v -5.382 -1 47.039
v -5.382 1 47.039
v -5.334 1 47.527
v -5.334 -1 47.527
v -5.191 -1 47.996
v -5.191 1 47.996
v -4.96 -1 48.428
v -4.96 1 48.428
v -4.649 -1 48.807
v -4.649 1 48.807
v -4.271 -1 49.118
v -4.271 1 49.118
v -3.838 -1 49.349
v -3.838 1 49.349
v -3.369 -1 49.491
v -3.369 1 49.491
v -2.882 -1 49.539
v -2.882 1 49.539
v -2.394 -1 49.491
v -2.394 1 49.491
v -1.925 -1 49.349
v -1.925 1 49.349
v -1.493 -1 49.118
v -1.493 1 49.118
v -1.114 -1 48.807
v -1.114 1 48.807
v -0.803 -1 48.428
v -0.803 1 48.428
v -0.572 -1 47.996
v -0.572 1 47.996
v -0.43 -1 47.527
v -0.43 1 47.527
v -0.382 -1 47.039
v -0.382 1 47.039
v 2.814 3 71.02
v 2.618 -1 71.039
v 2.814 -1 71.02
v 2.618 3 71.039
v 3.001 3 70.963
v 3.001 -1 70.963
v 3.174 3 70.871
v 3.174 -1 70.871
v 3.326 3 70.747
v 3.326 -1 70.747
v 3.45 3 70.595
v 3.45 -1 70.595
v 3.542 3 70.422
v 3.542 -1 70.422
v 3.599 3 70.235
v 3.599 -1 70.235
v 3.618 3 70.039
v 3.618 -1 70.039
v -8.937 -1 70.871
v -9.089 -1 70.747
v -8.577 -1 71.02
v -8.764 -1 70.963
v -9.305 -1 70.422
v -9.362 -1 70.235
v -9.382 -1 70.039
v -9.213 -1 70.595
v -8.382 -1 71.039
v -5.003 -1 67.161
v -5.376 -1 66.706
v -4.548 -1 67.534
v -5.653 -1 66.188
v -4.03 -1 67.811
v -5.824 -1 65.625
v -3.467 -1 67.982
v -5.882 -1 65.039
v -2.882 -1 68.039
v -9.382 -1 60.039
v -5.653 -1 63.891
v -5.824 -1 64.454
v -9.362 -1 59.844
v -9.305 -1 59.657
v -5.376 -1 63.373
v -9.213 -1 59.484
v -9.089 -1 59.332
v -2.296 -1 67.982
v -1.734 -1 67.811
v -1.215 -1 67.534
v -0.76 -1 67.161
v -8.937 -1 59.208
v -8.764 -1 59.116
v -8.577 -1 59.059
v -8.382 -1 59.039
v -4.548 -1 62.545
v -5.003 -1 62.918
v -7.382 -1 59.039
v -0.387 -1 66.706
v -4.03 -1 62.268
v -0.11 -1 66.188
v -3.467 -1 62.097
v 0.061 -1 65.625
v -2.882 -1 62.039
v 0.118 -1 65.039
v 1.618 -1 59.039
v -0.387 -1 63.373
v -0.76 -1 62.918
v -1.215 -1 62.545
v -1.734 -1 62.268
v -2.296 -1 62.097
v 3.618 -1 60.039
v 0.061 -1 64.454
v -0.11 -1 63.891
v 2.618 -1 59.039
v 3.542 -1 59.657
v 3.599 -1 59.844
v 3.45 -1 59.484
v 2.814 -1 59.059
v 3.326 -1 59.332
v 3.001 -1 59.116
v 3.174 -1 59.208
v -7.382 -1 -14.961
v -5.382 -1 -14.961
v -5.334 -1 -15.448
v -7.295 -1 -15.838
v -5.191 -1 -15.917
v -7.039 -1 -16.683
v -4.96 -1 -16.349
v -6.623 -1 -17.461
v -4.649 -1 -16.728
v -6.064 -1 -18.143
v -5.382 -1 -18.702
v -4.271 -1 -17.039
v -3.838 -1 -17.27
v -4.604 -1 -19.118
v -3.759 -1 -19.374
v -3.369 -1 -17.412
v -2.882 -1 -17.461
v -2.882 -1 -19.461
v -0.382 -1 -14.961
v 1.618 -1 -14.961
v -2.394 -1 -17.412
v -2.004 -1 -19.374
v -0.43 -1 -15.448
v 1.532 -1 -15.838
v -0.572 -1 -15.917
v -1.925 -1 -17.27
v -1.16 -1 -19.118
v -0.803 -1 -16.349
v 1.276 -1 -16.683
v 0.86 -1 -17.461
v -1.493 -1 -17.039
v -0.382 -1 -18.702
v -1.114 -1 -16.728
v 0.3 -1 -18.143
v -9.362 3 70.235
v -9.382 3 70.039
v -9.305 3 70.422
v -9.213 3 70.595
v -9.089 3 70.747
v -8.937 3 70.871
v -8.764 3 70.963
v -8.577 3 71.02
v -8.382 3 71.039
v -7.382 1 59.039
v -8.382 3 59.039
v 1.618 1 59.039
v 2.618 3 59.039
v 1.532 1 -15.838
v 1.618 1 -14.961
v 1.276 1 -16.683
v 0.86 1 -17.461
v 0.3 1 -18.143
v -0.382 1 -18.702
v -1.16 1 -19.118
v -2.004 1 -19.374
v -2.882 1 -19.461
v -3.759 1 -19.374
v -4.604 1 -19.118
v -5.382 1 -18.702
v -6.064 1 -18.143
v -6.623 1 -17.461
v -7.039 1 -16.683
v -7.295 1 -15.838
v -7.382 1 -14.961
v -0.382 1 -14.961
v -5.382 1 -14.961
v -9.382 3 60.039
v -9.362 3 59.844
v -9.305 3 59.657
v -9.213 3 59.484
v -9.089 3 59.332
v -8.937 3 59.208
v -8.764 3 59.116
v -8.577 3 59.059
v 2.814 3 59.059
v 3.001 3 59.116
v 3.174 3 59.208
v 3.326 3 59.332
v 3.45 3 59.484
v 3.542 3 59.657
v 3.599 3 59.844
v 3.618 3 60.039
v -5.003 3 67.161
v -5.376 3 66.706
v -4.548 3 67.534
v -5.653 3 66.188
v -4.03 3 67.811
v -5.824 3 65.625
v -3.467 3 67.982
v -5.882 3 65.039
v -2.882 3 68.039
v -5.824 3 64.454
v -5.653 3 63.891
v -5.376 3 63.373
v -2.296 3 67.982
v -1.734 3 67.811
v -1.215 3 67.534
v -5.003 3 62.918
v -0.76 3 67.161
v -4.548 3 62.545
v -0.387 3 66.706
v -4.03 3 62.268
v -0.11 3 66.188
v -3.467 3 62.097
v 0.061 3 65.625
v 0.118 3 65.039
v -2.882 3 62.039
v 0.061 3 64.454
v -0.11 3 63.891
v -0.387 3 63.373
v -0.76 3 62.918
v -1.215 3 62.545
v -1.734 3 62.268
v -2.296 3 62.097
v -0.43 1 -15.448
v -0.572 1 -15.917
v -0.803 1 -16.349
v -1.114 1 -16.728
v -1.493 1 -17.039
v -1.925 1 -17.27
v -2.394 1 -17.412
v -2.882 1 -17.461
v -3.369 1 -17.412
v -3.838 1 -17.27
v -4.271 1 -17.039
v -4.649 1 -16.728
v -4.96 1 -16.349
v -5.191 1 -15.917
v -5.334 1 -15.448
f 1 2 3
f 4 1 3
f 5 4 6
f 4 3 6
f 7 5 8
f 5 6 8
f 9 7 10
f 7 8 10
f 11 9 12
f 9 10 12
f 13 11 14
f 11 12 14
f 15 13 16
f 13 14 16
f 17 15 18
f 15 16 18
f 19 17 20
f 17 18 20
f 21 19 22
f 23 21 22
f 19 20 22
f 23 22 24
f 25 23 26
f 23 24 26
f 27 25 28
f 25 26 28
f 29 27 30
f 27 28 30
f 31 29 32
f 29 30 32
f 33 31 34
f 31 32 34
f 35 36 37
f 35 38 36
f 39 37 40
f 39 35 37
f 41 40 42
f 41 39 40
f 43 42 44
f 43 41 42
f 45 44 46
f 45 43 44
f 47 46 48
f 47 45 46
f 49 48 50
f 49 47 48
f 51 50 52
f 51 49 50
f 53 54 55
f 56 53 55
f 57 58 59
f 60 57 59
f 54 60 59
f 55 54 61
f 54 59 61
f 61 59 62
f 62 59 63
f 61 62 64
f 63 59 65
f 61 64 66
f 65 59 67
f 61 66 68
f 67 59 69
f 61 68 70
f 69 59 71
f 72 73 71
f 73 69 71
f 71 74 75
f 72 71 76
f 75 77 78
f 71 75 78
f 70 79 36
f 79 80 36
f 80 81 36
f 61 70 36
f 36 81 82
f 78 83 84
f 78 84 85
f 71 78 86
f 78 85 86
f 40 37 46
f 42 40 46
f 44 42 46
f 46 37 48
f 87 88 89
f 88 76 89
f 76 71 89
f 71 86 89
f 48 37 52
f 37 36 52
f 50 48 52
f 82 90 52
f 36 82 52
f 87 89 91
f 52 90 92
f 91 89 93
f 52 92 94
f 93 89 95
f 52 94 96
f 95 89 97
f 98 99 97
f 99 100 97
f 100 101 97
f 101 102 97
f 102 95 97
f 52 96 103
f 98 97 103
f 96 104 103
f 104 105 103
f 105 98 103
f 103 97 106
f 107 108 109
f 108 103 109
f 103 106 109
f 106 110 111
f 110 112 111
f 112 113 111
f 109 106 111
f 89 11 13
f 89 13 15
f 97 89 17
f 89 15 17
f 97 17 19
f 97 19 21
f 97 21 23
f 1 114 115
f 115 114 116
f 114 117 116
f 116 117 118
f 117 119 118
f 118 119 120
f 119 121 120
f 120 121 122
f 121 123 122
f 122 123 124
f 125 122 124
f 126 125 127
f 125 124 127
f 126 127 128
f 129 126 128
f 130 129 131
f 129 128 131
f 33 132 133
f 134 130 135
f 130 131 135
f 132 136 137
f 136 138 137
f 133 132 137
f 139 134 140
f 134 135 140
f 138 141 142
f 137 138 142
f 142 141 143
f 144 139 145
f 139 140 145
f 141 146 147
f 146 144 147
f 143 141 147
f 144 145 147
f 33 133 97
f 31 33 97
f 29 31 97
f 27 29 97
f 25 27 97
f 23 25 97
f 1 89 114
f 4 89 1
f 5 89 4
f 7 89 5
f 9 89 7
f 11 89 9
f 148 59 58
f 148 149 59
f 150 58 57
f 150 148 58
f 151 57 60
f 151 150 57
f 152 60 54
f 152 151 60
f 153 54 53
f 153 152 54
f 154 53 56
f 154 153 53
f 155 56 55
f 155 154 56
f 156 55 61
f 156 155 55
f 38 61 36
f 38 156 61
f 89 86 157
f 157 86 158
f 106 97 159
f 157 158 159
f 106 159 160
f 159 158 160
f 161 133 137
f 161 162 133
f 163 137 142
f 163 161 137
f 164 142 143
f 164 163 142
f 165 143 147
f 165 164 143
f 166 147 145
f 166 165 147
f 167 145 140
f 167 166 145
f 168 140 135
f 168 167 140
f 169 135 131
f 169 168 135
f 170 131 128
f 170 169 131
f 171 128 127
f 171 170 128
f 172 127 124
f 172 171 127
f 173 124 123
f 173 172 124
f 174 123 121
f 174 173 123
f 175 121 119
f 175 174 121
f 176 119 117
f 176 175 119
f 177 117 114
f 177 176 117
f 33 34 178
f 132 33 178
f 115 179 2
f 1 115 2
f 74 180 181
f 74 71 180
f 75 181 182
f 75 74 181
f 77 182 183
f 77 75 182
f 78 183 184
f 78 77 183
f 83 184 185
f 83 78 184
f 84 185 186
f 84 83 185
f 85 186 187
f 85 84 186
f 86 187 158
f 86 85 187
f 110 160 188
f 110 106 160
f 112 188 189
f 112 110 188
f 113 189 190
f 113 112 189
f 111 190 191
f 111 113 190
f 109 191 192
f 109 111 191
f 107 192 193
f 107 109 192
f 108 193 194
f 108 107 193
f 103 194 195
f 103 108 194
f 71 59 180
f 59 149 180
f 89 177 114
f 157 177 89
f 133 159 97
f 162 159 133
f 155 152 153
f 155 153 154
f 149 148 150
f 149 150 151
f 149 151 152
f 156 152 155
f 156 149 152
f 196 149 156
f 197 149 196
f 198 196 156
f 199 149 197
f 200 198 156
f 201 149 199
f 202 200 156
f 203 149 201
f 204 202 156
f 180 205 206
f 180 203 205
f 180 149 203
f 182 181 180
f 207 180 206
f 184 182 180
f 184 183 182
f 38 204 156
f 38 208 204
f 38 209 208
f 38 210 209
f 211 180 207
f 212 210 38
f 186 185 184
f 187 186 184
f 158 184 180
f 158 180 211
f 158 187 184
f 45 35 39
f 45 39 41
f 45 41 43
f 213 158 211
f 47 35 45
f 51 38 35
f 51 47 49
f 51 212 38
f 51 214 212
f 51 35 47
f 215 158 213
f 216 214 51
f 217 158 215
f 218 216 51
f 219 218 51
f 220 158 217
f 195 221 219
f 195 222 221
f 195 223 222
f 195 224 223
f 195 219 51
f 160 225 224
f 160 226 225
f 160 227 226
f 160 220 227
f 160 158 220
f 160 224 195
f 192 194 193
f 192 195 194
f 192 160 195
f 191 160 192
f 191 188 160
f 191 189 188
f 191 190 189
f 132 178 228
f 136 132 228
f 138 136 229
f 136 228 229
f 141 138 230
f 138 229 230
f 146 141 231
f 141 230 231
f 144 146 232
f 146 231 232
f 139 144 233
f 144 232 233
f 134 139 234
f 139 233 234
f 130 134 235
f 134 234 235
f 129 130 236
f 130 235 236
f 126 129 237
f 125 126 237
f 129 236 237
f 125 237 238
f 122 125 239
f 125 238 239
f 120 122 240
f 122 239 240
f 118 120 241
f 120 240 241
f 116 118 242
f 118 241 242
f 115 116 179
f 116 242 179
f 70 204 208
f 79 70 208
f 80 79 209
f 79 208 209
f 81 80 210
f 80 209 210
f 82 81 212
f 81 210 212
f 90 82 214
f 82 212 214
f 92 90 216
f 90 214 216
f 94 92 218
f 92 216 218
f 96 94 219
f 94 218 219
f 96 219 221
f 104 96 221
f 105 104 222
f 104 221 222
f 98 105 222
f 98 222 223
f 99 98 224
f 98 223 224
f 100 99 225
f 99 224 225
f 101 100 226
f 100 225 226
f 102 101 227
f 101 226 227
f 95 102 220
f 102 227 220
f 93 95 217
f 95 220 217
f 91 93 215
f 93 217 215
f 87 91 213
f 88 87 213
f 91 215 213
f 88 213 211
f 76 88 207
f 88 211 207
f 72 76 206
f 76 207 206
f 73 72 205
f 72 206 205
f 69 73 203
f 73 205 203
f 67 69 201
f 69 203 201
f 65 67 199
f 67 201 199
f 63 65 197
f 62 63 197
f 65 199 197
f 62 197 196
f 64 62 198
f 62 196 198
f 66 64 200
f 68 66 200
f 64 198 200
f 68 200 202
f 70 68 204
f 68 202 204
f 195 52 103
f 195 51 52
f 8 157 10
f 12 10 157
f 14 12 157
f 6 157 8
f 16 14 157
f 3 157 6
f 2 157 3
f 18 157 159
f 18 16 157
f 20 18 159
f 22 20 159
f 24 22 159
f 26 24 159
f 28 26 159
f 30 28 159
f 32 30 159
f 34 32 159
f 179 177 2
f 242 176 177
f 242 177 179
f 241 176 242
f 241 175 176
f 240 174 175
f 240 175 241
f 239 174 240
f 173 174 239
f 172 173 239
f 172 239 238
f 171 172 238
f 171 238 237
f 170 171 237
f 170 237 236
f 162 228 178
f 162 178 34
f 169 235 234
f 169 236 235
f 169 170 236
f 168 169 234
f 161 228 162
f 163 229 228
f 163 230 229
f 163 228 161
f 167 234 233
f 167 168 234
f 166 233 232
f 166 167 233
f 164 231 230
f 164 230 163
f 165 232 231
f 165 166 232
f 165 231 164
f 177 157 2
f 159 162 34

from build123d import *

# Parameters (mm, degrees)
BOSS_EXTRUDE1_DEPTH = 1
CUT_EXTRUDE1_DEPTH  = 2
SKETCH3_W           = 13
SKETCH3_H           = 12
BOSS_EXTRUDE2_DEPTH = 2
FILLET1_R           = 1
SKETCH4_R           = 3
CUT_EXTRUDE2_DEPTH  = 4


with BuildPart() as part:
    # Sketch1 → Boss-Extrude1 (new, symmetric)
    with BuildSketch(Plane(origin=(0, 0, 0), x_dir=(1, 0, 0), z_dir=(0, 1, 0))):
        with BuildLine():
            Line((-7.381578947, 14.960526316), (-7.381578947, -65.039473684))
            ThreePointArc((-7.381578947, -65.039473684), (-2.881578947, -69.539473684), (1.618421053, -65.039473684))
            Line((1.618421053, -65.039473684), (1.618421053, 14.960526316))
            ThreePointArc((1.618421053, 14.960526316), (-2.881578947, 19.460526316), (-7.381578947, 14.960526316))
        make_face()
    extrude(amount=BOSS_EXTRUDE1_DEPTH, both=True)

    # Sketch2 → Cut-Extrude1 (cut)
    with BuildSketch(Plane(origin=(0, 1, 0), x_dir=(1, 0, 0), z_dir=(0, 1, 0))):
        with BuildLine():
            Line((-5.381578947, 14.960526316), (-5.381578947, -47.039473684))
            ThreePointArc((-5.381578947, -47.039473684), (-2.881578947, -49.539473684), (-0.381578947, -47.039473684))
            Line((-0.381578947, -47.039473684), (-0.381578947, 14.960526316))
            ThreePointArc((-0.381578947, 14.960526316), (-2.881578947, 17.460526316), (-5.381578947, 14.960526316))
        make_face()
    extrude(amount=-CUT_EXTRUDE1_DEPTH, mode=Mode.SUBTRACT)

    # Sketch3 → Boss-Extrude2 (add, symmetric)
    with BuildSketch(Plane(origin=(0, 1, 0), x_dir=(1, 0, 0), z_dir=(0, 1, 0))):
        with Locations((-2.881578947, -65.039473684)):
            Rectangle(SKETCH3_W, SKETCH3_H)
    extrude(amount=BOSS_EXTRUDE2_DEPTH, both=True)

    # Fillet1
    fillet1_edges = [part.edges().sort_by_distance(p)[0] for p in [
        (3.618421053, 1, 59.039473684),
        (-9.381578947, 1, 59.039473684),
        (-9.381578947, 1, 71.039473684),
        (3.618421053, 1, 71.039473684),
    ]]
    fillet(fillet1_edges, radius=FILLET1_R)

    # Sketch4 → Cut-Extrude2 (cut)
    with BuildSketch(Plane(origin=(0, 3, 0), x_dir=(1, 0, 0), z_dir=(0, 1, 0))):
        with Locations(Location((-2.881578947, -65.039473684, 0), (0, 0, 270))):
            Circle(SKETCH4_R)
    extrude(amount=-CUT_EXTRUDE2_DEPTH, mode=Mode.SUBTRACT)


solid = part.part
